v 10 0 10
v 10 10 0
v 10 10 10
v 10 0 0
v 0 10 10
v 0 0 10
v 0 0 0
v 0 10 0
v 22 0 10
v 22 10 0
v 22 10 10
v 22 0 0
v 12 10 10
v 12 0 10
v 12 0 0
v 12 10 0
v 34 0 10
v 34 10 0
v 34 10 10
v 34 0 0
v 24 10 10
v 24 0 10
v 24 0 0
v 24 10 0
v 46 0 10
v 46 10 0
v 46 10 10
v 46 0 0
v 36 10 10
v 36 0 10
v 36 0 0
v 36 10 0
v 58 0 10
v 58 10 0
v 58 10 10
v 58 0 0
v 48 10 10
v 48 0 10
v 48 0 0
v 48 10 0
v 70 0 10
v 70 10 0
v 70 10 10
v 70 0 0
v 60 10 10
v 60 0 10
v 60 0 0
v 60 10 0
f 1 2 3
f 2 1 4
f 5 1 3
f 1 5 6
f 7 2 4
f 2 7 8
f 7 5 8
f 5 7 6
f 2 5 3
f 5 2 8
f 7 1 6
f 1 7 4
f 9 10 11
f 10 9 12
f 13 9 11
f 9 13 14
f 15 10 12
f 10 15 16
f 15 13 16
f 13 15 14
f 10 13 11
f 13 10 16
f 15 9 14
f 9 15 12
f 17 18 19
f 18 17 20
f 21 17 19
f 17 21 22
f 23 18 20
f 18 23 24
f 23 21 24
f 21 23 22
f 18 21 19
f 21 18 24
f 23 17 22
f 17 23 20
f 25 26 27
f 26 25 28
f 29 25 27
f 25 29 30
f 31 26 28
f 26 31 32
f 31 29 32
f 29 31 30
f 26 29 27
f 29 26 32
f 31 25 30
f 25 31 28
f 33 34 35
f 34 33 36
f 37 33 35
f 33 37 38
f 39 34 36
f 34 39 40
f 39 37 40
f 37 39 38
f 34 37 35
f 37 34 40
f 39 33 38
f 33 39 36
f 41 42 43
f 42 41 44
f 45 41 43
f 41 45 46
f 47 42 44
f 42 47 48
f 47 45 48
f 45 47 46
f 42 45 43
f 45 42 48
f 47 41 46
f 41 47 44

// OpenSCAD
color("red") cube(10);
color("blue") translate([12, 0, 0]) cube(10);
color("red") translate([24, 0, 0]) cube(10);
color("green") translate([36, 0, 0]) cube(10);
color("red") translate([48, 0, 0]) cube(10);
translate([60, 0, 0]) cube(10);
